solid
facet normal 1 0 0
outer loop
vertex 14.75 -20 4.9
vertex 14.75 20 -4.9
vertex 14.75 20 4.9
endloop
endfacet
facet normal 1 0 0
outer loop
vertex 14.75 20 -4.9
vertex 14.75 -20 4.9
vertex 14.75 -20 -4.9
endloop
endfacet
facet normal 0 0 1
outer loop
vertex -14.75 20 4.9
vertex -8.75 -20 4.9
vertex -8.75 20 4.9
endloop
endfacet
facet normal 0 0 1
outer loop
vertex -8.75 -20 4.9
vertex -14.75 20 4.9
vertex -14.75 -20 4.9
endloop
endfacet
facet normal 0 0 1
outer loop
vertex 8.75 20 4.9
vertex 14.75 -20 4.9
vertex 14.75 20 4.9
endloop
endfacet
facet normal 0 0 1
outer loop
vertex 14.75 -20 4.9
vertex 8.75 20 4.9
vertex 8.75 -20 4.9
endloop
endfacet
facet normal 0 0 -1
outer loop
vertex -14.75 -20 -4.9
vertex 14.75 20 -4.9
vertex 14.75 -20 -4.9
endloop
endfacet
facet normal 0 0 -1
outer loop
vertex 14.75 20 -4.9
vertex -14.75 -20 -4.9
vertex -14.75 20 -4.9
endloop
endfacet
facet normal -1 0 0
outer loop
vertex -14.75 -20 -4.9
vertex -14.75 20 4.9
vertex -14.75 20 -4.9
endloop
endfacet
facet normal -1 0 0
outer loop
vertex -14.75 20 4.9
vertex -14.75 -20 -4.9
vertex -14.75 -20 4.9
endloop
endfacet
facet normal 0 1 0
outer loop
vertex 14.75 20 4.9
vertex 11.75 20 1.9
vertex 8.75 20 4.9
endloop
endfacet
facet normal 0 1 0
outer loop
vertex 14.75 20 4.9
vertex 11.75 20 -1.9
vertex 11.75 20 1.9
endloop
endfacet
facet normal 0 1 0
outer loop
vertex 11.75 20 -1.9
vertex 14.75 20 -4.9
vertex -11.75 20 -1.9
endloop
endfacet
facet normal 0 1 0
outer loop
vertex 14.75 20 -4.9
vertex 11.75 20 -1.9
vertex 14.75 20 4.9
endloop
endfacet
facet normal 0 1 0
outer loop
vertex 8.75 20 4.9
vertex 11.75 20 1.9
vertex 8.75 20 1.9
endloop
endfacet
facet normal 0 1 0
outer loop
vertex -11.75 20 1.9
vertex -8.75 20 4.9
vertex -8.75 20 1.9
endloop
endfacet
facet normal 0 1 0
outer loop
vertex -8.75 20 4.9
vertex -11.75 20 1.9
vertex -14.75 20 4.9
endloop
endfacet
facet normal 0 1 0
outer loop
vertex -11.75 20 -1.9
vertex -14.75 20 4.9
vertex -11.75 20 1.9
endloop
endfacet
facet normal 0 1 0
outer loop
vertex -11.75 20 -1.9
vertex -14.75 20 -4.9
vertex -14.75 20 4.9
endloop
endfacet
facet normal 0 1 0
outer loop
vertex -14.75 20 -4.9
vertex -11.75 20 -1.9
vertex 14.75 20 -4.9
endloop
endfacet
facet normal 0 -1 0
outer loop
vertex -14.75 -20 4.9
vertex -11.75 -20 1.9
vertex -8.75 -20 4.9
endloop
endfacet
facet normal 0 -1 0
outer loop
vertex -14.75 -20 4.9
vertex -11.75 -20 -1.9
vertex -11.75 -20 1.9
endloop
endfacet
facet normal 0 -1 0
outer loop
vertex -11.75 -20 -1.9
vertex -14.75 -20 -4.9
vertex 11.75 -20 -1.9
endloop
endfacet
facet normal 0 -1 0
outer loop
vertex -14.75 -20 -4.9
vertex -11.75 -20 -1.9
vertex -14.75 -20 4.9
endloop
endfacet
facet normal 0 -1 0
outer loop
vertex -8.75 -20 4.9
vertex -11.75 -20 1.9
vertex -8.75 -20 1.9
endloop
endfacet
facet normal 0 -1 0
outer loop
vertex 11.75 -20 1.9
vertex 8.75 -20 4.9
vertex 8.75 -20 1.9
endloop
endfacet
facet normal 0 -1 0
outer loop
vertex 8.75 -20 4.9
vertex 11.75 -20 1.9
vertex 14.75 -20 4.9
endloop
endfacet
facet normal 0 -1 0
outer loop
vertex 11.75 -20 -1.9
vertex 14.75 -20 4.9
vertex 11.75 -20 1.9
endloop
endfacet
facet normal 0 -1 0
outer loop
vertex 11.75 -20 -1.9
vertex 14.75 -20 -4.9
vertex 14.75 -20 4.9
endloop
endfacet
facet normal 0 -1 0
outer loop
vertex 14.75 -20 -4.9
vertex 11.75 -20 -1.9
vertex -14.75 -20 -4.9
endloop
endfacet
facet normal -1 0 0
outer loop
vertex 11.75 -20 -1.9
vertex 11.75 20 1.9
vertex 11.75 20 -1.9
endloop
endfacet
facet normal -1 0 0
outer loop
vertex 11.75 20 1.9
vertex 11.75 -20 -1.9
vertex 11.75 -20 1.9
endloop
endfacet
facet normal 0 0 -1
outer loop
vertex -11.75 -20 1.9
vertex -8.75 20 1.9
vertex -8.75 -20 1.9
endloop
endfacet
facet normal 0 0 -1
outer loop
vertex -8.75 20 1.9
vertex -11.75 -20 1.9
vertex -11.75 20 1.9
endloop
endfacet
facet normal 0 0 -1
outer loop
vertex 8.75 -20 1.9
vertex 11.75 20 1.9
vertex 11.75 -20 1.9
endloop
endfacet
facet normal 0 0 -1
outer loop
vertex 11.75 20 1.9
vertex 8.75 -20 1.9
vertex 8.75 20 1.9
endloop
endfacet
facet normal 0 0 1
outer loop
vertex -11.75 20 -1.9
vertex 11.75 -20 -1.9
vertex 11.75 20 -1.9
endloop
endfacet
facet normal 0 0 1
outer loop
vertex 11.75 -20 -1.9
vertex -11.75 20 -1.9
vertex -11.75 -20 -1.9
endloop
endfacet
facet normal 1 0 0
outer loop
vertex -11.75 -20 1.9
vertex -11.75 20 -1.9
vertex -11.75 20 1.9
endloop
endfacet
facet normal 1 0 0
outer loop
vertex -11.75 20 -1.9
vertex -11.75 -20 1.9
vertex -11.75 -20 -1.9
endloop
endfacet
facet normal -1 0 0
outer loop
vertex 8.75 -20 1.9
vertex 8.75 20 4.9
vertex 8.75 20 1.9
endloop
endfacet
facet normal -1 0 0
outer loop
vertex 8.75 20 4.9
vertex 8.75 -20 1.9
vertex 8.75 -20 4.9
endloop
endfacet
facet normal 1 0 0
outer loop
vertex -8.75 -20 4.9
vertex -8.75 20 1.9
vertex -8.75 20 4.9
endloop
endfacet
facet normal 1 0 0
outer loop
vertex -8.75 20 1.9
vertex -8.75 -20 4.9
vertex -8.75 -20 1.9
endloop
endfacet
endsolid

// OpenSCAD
// Width of the clamp
width=23.5;
// Length of the clamp
length=40;
// Thickness of the clamp
thickness=3.8;
// Wall thickness
material=3;

difference() {
  cube([width+2*material, length, thickness+2*material],true);
  cube([width, length+1, thickness],true);
  translate([0,0,material]) cube([width-2*material, length+1, thickness+2*material],true);
}
